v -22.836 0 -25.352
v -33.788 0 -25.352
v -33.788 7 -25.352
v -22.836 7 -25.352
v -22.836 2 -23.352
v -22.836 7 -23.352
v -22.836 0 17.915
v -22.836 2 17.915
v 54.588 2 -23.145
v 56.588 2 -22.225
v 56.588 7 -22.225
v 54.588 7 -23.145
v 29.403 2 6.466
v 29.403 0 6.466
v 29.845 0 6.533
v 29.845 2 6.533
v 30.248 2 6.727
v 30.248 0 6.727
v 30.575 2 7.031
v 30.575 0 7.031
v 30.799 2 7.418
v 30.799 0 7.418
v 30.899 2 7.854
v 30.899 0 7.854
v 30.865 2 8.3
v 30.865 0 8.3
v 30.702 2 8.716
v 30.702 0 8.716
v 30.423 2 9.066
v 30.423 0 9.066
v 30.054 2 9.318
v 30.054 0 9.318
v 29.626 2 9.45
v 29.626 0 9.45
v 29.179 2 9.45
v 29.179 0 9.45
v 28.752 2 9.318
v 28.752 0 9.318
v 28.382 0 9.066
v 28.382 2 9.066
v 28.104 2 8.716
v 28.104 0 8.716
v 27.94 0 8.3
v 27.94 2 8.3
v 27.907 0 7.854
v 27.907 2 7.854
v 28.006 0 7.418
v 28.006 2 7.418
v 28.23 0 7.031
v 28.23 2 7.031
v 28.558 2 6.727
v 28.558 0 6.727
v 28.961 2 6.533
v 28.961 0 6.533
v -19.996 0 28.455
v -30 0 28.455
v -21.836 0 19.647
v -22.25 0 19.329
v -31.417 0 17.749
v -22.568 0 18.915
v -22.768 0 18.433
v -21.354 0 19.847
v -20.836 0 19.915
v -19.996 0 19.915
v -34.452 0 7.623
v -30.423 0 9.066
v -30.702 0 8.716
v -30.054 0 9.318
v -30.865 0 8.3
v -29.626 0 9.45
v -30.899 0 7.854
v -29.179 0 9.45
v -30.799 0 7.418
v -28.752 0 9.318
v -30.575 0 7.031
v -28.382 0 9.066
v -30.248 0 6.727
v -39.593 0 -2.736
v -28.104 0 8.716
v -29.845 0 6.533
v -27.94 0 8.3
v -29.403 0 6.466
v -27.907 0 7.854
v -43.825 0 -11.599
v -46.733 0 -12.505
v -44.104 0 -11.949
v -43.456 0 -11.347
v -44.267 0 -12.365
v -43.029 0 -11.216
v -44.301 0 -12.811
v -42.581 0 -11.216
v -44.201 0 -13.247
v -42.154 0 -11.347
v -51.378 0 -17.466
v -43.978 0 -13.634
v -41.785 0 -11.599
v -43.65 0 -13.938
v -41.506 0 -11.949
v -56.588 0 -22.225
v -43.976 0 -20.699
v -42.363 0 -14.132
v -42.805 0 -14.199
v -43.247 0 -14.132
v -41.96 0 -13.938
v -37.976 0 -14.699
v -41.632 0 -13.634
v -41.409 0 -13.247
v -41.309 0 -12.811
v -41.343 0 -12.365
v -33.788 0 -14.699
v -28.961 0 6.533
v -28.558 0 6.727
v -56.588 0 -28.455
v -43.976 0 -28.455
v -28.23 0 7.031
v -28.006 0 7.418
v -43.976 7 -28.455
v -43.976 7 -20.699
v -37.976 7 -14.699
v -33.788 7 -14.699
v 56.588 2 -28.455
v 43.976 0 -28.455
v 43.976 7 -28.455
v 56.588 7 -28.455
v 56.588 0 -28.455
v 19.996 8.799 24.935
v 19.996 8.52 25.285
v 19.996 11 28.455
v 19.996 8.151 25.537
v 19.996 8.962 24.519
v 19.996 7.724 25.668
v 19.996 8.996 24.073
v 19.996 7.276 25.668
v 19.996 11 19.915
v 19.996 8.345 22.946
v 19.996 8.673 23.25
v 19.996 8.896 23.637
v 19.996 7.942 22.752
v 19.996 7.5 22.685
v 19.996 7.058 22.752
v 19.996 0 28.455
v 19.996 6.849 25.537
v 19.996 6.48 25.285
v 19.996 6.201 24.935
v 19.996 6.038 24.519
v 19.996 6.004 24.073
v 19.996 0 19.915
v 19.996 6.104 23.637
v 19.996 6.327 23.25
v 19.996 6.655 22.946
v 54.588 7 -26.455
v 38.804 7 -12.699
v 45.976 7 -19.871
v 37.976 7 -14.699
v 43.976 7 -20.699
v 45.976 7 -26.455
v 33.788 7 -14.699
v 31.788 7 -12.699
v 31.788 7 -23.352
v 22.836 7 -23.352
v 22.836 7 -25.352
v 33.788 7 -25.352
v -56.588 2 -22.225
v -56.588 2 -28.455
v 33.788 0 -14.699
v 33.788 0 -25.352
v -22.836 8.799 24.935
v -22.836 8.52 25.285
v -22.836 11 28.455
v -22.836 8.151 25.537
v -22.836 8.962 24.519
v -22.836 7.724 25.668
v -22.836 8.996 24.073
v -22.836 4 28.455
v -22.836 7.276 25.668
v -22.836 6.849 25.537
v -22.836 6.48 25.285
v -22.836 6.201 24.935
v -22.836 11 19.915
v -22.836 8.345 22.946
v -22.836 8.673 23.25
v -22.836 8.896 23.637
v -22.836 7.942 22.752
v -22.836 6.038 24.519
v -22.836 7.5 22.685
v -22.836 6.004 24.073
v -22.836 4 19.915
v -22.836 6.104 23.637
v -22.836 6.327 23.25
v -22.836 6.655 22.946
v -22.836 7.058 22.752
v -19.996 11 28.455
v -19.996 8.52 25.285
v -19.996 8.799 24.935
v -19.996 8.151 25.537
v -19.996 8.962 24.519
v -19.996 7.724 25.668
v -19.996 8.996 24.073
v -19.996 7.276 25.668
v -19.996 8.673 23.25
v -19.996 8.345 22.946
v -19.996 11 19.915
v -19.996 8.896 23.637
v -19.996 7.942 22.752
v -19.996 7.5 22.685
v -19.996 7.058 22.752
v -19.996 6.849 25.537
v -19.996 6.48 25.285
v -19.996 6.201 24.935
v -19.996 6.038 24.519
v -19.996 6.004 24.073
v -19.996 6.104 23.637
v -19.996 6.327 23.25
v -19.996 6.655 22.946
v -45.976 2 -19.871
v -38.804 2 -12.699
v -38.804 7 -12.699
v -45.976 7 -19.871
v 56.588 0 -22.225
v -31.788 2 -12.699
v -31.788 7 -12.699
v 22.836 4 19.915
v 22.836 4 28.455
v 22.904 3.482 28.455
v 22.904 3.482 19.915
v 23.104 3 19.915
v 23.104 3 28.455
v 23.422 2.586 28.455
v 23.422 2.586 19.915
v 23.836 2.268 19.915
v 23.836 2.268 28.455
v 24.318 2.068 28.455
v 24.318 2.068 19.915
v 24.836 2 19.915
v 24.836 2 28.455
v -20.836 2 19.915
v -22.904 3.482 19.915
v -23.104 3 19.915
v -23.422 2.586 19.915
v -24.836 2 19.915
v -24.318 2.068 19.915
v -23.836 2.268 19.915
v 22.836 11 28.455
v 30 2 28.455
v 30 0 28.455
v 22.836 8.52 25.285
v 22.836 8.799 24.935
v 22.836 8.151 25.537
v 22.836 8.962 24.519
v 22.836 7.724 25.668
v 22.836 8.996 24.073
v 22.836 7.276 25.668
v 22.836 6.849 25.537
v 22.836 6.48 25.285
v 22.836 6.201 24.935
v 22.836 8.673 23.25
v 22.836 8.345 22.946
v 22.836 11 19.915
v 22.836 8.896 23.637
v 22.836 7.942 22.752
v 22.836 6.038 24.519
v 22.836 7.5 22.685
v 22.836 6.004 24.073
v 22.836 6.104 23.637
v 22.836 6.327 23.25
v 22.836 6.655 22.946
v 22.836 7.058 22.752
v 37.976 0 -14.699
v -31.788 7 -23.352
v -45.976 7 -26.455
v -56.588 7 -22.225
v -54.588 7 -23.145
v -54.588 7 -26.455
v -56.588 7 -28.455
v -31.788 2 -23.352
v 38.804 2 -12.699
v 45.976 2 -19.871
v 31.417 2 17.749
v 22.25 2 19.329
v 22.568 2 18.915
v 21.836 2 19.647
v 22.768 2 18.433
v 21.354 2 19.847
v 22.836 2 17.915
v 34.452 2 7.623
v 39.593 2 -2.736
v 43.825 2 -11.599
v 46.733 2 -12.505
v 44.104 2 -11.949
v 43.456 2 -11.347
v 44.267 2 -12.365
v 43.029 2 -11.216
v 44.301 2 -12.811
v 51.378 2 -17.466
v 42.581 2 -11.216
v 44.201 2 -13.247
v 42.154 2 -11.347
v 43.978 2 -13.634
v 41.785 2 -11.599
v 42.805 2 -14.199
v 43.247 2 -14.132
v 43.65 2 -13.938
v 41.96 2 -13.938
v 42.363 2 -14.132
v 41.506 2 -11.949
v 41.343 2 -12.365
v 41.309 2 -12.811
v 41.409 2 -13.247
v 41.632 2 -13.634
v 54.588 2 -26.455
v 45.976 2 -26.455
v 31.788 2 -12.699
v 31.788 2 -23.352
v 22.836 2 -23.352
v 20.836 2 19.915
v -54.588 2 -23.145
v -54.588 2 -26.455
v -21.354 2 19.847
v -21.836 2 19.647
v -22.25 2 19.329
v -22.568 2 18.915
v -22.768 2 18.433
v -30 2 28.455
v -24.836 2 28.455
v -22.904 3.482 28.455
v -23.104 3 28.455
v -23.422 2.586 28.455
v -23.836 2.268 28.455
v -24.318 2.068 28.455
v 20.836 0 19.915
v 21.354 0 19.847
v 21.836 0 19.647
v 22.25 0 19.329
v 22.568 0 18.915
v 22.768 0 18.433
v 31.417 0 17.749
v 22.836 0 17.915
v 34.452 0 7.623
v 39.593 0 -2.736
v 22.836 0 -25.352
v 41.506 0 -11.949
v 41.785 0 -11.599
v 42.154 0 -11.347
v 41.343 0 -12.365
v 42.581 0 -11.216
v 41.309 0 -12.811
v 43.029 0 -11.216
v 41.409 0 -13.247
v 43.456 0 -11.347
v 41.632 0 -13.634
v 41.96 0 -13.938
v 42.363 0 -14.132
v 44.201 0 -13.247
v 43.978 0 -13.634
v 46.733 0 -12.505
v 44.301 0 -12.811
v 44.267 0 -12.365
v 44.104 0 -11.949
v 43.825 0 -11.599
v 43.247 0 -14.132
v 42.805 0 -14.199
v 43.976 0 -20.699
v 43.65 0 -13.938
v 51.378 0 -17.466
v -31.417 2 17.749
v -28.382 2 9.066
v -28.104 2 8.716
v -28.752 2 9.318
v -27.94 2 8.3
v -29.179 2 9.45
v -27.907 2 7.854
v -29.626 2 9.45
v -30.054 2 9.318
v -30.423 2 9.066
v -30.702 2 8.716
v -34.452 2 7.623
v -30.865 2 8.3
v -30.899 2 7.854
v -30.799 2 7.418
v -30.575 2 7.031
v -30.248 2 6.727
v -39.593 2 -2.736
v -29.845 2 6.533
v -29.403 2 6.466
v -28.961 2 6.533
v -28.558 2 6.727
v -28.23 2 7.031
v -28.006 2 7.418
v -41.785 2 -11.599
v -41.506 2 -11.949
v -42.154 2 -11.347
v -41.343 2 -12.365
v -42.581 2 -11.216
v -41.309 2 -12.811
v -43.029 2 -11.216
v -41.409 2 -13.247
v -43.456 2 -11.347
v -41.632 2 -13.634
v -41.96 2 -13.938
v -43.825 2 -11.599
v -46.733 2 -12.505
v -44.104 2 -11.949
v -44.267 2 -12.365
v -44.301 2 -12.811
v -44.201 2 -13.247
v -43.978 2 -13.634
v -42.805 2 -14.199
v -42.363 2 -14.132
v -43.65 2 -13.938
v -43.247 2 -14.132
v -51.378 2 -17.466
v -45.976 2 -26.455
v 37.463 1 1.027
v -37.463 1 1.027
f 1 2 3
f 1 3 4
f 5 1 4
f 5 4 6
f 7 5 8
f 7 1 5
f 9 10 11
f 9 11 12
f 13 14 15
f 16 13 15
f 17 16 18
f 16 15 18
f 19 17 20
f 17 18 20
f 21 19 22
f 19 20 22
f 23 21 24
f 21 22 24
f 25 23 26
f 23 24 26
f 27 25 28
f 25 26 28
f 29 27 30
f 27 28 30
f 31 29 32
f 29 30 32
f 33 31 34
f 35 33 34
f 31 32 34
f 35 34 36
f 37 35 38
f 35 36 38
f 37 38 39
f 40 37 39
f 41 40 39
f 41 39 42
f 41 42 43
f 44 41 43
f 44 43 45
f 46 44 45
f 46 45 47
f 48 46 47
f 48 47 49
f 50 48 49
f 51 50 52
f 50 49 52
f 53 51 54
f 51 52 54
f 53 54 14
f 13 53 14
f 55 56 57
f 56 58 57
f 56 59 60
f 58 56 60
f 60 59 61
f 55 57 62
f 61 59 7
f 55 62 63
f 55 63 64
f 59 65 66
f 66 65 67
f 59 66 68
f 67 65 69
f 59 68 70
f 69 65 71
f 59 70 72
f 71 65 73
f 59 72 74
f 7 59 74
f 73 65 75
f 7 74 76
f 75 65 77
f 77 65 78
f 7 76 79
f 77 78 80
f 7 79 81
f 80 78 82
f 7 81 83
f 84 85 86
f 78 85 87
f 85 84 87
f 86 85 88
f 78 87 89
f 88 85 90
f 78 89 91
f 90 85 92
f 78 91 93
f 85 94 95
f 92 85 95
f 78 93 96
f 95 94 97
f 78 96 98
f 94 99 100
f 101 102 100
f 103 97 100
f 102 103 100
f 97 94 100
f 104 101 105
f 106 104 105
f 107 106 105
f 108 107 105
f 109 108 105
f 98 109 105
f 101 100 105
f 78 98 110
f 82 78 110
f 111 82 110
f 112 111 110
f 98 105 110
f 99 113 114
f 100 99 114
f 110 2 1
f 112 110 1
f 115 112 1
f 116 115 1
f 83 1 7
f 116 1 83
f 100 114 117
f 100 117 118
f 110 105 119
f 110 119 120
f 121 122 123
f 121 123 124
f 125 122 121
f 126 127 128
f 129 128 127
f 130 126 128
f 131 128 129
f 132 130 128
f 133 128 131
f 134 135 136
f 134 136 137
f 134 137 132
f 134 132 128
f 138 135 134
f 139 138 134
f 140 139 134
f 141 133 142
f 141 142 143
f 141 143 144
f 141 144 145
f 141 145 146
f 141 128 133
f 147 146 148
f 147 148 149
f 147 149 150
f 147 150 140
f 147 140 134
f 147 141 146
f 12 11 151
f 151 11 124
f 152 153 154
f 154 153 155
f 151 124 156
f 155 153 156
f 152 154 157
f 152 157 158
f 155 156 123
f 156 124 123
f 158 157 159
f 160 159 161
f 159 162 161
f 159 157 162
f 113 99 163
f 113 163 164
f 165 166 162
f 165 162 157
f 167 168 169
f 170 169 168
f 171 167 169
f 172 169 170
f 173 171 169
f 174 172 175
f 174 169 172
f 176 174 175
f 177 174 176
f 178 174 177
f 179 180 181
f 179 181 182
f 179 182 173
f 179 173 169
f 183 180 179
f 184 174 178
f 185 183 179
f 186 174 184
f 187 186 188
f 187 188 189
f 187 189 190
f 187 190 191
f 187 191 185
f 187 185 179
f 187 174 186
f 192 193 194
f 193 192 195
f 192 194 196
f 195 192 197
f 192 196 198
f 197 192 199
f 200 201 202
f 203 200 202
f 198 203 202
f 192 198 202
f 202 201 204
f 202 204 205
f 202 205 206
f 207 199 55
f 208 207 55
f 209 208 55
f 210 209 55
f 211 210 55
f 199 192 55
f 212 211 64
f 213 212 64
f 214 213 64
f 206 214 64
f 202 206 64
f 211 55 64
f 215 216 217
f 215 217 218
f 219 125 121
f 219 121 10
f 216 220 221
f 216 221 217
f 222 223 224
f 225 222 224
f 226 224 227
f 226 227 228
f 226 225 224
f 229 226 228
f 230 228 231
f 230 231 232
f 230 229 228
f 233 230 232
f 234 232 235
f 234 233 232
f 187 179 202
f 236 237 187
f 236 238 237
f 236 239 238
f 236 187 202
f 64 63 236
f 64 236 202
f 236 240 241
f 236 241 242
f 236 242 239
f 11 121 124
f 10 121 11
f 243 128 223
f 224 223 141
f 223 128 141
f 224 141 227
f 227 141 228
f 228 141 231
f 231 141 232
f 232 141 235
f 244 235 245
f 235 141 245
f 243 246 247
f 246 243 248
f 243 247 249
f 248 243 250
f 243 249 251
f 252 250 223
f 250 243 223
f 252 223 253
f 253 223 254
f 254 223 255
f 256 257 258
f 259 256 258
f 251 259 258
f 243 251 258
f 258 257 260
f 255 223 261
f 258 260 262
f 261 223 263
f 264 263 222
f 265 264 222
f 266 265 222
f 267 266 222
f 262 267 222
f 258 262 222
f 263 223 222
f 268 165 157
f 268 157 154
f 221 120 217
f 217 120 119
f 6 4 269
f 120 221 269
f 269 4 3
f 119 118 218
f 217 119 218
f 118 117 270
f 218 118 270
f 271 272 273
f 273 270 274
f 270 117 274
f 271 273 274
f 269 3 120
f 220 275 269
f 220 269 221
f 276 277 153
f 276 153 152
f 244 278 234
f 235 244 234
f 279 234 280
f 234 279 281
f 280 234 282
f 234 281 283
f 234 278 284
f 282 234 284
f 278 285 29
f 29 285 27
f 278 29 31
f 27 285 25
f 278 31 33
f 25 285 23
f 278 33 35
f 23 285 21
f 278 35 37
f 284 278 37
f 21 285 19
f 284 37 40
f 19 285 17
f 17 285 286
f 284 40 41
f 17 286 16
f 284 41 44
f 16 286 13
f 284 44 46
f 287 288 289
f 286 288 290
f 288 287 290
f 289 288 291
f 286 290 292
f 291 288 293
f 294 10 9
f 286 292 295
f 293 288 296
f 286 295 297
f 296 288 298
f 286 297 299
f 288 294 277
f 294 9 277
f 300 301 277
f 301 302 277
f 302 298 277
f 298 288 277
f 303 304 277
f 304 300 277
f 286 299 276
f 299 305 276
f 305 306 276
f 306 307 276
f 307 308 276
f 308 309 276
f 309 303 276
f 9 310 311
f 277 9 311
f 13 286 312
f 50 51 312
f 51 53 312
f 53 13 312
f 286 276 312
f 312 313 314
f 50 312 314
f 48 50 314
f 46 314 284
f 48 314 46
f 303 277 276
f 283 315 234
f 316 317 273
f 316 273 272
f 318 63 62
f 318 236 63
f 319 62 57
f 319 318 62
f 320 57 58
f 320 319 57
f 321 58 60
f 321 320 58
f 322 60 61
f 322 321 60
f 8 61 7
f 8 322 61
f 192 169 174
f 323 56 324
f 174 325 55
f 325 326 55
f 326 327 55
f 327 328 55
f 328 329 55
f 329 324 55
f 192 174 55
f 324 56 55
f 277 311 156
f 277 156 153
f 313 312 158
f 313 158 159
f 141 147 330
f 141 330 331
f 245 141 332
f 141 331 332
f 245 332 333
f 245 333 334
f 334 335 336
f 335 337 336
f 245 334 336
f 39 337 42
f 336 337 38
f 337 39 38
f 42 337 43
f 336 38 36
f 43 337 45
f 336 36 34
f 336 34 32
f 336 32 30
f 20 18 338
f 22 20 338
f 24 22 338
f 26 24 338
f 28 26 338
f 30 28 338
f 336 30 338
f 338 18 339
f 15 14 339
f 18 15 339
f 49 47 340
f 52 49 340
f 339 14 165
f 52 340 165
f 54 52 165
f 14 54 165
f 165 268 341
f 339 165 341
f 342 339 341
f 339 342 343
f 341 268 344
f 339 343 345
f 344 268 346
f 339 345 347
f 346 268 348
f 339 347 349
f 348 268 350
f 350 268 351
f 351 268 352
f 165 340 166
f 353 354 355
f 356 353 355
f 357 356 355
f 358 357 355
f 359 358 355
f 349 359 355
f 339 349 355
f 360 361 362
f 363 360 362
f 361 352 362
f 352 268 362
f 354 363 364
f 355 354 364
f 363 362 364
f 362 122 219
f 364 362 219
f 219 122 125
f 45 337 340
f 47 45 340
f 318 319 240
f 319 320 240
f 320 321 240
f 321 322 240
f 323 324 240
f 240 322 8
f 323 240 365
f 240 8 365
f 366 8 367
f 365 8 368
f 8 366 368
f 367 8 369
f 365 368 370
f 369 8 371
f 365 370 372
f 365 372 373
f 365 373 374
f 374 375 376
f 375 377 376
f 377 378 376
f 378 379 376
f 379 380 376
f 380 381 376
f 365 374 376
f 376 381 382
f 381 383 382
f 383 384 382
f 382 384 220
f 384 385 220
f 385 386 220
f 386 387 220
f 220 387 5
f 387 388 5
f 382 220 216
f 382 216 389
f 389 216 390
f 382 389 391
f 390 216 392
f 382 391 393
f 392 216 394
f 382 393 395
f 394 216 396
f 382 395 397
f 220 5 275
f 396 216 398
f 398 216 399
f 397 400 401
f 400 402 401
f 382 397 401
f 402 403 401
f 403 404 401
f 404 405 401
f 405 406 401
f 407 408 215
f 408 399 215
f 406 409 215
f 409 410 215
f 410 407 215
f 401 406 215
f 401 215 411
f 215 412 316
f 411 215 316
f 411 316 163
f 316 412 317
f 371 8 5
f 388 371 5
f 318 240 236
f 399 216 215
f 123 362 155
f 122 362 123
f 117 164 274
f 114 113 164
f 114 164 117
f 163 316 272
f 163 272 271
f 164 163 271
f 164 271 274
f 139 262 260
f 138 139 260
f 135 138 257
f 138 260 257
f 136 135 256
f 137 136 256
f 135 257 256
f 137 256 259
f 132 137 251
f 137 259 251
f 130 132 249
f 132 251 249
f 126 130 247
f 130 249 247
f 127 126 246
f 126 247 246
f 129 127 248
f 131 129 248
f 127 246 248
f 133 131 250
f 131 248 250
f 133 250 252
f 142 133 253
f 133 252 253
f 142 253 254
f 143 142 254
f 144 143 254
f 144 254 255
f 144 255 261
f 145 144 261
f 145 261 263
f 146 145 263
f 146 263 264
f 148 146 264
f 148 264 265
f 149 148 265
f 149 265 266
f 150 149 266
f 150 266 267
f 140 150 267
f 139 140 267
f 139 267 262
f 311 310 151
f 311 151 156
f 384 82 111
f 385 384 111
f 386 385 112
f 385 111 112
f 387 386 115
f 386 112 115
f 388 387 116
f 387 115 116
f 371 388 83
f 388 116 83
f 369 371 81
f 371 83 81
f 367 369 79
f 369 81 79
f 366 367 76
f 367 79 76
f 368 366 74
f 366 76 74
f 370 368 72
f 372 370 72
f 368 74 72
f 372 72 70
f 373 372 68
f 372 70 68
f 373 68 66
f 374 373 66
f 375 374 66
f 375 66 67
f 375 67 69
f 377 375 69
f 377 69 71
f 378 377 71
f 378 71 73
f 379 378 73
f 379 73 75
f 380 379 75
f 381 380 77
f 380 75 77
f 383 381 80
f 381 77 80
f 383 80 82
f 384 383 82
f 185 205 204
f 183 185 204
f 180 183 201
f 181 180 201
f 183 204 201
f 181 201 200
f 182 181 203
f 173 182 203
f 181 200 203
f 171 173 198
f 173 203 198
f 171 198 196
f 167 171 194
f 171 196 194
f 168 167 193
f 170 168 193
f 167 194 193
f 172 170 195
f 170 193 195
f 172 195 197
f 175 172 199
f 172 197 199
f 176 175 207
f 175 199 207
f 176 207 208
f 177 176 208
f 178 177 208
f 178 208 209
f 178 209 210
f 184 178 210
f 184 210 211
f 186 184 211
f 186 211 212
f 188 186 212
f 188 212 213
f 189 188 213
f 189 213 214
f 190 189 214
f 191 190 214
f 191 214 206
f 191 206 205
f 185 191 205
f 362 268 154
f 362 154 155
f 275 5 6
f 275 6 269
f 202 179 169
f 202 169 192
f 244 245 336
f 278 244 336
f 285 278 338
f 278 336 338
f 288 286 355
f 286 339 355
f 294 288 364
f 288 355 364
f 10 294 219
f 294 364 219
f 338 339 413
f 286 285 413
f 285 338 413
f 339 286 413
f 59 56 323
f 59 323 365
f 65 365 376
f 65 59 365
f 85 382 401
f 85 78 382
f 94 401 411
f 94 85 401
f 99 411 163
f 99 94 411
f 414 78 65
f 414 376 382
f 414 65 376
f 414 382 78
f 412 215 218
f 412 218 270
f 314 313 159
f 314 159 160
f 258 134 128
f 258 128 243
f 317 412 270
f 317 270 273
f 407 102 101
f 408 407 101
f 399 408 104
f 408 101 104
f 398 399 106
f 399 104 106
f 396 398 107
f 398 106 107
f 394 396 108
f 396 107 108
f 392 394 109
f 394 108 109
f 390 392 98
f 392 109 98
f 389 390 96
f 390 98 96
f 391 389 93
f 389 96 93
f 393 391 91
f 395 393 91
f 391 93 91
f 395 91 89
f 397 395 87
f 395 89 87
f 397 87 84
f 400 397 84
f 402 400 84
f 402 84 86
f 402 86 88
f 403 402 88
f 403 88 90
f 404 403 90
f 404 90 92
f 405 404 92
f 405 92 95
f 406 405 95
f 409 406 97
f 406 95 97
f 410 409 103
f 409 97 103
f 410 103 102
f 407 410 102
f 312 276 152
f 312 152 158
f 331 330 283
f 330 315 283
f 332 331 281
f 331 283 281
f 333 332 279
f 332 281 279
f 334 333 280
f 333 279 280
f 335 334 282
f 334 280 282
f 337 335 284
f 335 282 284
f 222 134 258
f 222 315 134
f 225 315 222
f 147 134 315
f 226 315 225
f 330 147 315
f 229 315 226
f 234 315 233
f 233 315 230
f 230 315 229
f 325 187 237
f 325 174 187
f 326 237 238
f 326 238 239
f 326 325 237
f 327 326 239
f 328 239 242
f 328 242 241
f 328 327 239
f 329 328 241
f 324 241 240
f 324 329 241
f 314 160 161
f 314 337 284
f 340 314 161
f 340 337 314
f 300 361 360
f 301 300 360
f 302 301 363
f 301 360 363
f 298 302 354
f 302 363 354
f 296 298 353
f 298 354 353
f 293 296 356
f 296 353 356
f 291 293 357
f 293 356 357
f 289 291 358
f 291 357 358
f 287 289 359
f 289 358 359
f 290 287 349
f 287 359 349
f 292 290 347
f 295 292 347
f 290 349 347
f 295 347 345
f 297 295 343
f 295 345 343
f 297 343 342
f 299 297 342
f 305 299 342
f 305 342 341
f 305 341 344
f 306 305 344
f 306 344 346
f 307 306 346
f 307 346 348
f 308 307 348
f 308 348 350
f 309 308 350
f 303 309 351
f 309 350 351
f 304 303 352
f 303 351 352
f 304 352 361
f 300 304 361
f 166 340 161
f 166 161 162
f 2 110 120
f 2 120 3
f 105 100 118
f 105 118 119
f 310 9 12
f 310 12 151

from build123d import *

# Parameters (mm, degrees)
BOSS_EXTRUDE1_DEPTH   = 2
BOSS_EXTRUDE1_2_DEPTH = 2
BOSS_EXTRUDE3_DEPTH   = 5
SKETCH3_R             = 1.5
CUT_EXTRUDE1_DEPTH    = 2
SKETCH5_W             = 2.84
SKETCH5_H             = 8.54
BOSS_EXTRUDE4_DEPTH   = 11
FILLET1_R             = 2
FILLET2_R             = 2
FILLET3_R             = 2
FILLET4_R             = 2
CUT_EXTRUDE3_REACH    = 87.082
SKETCH6_R             = 1.5


with BuildPart() as part:
    # Sketch1 → Boss-Extrude1 (new body)
    with BuildSketch(Plane(origin=(0, 0, 0), x_dir=(1, 0, 0), z_dir=(0, 1, 0))):
        with BuildLine():
            Line((-56.588314529, 22.22458238), (-56.588314529, 28.455124303))
            Line((-56.588314529, 28.455124303), (-43.97594504, 28.455124303))
            Line((-43.97594504, 28.455124303), (-43.97594504, 20.699262249))
            Line((-43.97594504, 20.699262249), (-37.97594504, 14.699262249))
            Line((-37.97594504, 14.699262249), (-33.787864348, 14.699262249))
            Line((-33.787864348, 14.699262249), (-33.787864348, 25.351696057))
            Line((-33.787864348, 25.351696057), (-22.836136218, 25.351696057))
            Line((-22.836136218, 25.351696057), (-22.836136218, -28.455124303))
            Line((-22.836136218, -28.455124303), (-30, -28.455124303))
            add(Edge.make_bspline(
                [(-30, -28.455124303), (-31.631264416, 1.062189743), (-56.588314529, 22.22458238)],
                knots=[0, 0, 0, 1, 1, 1], degree=2))
        make_face()
    extrude(amount=BOSS_EXTRUDE1_DEPTH)



with BuildPart() as body_2:
    # Sketch1 → Boss-Extrude1 2 (new body)
    with BuildSketch(Plane(origin=(0, 0, 0), x_dir=(1, 0, 0), z_dir=(0, 1, 0))):
        with BuildLine():
            Line((33.787864348, 25.351696057), (33.787864348, 14.699262249))
            Line((33.787864348, 14.699262249), (37.97594504, 14.699262249))
            Line((37.97594504, 14.699262249), (43.97594504, 20.699262249))
            Line((43.97594504, 20.699262249), (43.97594504, 28.455124303))
            Line((43.97594504, 28.455124303), (56.588314529, 28.455124303))
            Line((56.588314529, 28.455124303), (56.588314529, 22.22458238))
            add(Edge.make_bspline(
                [(30, -28.455124303), (31.631264416, 1.062189743), (56.588314529, 22.22458238)],
                knots=[0, 0, 0, 1, 1, 1], degree=2))
            Line((30, -28.455124303), (22.836136218, -28.455124303))
            Line((22.836136218, -28.455124303), (22.836136218, 25.351696057))
            Line((22.836136218, 25.351696057), (33.787864348, 25.351696057))
        make_face()
    extrude(amount=BOSS_EXTRUDE1_2_DEPTH)


with BuildPart() as part_1:
    add(part.part)

    add(body_2.part)  # Boss-Extrude3 merges body 2
    # Sketch2 → Boss-Extrude3 (add)
    with BuildSketch(Plane(origin=(0, 2, 0), x_dir=(1, 0, 0), z_dir=(0, 1, 0))):
        Polygon((-54.588314537, 23.145309778), (-56.588314538, 22.224582387), (-56.588314529, 28.455124303), (-43.97594504, 28.455124303), (-43.97594504, 20.699262249), (-37.97594504, 14.699262249), (-33.787864348, 14.699262249), (-33.787864348, 25.351696057), (-22.836136218, 25.351696057), (-22.836136218, 23.351696057), (-31.787864348, 23.351696057), (-31.787864348, 12.699262249), (-38.804372164, 12.699262249), (-45.97594504, 19.870835124), (-45.97594504, 26.455124303), (-54.588314532, 26.455124303), align=None)
        Polygon((22.836136218, 23.351696057), (22.836136218, 25.351696057), (33.787864348, 25.351696057), (33.787864348, 14.699262249), (37.97594504, 14.699262249), (43.97594504, 20.699262249), (43.97594504, 28.455124303), (56.588314529, 28.455124303), (56.588314538, 22.224582387), (54.588314537, 23.145309778), (54.588314532, 26.455124303), (45.97594504, 26.455124303), (45.97594504, 19.870835124), (38.804372164, 12.699262249), (31.787864348, 12.699262249), (31.787864348, 23.351696057), align=None)
    extrude(amount=BOSS_EXTRUDE3_DEPTH)

    # Sketch3 → Cut-Extrude1 (cut)
    with BuildSketch(Plane.XZ):
        with Locations(Location((-29.402732237, 7.966381693, 0), (0, 0, 270))):
            Circle(SKETCH3_R)
        with Locations(Location((-42.805062712, -12.698804379, 0), (0, 0, 270))):
            Circle(SKETCH3_R)
        with Locations(Location((29.402732237, 7.966381693, 0), (0, 0, 270))):
            Circle(SKETCH3_R)
        with Locations(Location((42.805062712, -12.698804379, 0), (0, 0, 270))):
            Circle(SKETCH3_R)
    extrude(amount=-CUT_EXTRUDE1_DEPTH, mode=Mode.SUBTRACT)

    # Sketch5 → Boss-Extrude4 (add)
    with BuildSketch(Plane(origin=(0, 0, 0), x_dir=(1, 0, 0), z_dir=(0, 1, 0))):
        with Locations((-21.416136218, -24.185124303)):
            Rectangle(SKETCH5_W, SKETCH5_H)
        with Locations((21.416136218, -24.185124303)):
            Rectangle(SKETCH5_W, SKETCH5_H)
    extrude(amount=BOSS_EXTRUDE4_DEPTH)

    # Fillet1
    fillet1_edges = [part_1.edges().sort_by_distance(p)[0] for p in [
        (-22.836136218, 2, 24.185124303),
    ]]
    fillet(fillet1_edges, radius=FILLET1_R)

    # Fillet2
    fillet2_edges = [part_1.edges().sort_by_distance(p)[0] for p in [
        (-22.836136218, 1, 19.915124303),
    ]]
    fillet(fillet2_edges, radius=FILLET2_R)

    # Fillet3
    fillet3_edges = [part_1.edges().sort_by_distance(p)[0] for p in [
        (22.836136218, 2, 24.185124303),
    ]]
    fillet(fillet3_edges, radius=FILLET3_R)

    # Fillet4
    fillet4_edges = [part_1.edges().sort_by_distance(p)[0] for p in [
        (22.836136218, 1, 19.915124303),
    ]]
    fillet(fillet4_edges, radius=FILLET4_R)

    # Cut-Extrude3: up to this face of the body (flat: up to its plane)
    cut_extrude3_end = Plane(part_1.part.faces().sort_by_distance((-22.836136218, 7.5, 24.185124303))[0])
    # Sketch6 → Cut-Extrude3 (cut, up to the picked face)
    with BuildSketch(Plane(origin=(22.836136218, 0, 0), x_dir=(0, 0, -1), z_dir=(1, 0, 0)), mode=Mode.PRIVATE) as cut_extrude3_sk1:
        with Locations((-24.185124303, 7.5)):
            Circle(SKETCH6_R)
    cut_extrude3_tool1 = split(extrude(cut_extrude3_sk1.sketch, amount=-CUT_EXTRUDE3_REACH, mode=Mode.PRIVATE), bisect_by=cut_extrude3_end, keep=Keep.BOTH, mode=Mode.PRIVATE)
    add(cut_extrude3_tool1.solids().sort_by(Axis((22.836136, 7.5, 24.185124), (-1, 0, 0)))[0], mode=Mode.SUBTRACT)


solid = part_1.part
